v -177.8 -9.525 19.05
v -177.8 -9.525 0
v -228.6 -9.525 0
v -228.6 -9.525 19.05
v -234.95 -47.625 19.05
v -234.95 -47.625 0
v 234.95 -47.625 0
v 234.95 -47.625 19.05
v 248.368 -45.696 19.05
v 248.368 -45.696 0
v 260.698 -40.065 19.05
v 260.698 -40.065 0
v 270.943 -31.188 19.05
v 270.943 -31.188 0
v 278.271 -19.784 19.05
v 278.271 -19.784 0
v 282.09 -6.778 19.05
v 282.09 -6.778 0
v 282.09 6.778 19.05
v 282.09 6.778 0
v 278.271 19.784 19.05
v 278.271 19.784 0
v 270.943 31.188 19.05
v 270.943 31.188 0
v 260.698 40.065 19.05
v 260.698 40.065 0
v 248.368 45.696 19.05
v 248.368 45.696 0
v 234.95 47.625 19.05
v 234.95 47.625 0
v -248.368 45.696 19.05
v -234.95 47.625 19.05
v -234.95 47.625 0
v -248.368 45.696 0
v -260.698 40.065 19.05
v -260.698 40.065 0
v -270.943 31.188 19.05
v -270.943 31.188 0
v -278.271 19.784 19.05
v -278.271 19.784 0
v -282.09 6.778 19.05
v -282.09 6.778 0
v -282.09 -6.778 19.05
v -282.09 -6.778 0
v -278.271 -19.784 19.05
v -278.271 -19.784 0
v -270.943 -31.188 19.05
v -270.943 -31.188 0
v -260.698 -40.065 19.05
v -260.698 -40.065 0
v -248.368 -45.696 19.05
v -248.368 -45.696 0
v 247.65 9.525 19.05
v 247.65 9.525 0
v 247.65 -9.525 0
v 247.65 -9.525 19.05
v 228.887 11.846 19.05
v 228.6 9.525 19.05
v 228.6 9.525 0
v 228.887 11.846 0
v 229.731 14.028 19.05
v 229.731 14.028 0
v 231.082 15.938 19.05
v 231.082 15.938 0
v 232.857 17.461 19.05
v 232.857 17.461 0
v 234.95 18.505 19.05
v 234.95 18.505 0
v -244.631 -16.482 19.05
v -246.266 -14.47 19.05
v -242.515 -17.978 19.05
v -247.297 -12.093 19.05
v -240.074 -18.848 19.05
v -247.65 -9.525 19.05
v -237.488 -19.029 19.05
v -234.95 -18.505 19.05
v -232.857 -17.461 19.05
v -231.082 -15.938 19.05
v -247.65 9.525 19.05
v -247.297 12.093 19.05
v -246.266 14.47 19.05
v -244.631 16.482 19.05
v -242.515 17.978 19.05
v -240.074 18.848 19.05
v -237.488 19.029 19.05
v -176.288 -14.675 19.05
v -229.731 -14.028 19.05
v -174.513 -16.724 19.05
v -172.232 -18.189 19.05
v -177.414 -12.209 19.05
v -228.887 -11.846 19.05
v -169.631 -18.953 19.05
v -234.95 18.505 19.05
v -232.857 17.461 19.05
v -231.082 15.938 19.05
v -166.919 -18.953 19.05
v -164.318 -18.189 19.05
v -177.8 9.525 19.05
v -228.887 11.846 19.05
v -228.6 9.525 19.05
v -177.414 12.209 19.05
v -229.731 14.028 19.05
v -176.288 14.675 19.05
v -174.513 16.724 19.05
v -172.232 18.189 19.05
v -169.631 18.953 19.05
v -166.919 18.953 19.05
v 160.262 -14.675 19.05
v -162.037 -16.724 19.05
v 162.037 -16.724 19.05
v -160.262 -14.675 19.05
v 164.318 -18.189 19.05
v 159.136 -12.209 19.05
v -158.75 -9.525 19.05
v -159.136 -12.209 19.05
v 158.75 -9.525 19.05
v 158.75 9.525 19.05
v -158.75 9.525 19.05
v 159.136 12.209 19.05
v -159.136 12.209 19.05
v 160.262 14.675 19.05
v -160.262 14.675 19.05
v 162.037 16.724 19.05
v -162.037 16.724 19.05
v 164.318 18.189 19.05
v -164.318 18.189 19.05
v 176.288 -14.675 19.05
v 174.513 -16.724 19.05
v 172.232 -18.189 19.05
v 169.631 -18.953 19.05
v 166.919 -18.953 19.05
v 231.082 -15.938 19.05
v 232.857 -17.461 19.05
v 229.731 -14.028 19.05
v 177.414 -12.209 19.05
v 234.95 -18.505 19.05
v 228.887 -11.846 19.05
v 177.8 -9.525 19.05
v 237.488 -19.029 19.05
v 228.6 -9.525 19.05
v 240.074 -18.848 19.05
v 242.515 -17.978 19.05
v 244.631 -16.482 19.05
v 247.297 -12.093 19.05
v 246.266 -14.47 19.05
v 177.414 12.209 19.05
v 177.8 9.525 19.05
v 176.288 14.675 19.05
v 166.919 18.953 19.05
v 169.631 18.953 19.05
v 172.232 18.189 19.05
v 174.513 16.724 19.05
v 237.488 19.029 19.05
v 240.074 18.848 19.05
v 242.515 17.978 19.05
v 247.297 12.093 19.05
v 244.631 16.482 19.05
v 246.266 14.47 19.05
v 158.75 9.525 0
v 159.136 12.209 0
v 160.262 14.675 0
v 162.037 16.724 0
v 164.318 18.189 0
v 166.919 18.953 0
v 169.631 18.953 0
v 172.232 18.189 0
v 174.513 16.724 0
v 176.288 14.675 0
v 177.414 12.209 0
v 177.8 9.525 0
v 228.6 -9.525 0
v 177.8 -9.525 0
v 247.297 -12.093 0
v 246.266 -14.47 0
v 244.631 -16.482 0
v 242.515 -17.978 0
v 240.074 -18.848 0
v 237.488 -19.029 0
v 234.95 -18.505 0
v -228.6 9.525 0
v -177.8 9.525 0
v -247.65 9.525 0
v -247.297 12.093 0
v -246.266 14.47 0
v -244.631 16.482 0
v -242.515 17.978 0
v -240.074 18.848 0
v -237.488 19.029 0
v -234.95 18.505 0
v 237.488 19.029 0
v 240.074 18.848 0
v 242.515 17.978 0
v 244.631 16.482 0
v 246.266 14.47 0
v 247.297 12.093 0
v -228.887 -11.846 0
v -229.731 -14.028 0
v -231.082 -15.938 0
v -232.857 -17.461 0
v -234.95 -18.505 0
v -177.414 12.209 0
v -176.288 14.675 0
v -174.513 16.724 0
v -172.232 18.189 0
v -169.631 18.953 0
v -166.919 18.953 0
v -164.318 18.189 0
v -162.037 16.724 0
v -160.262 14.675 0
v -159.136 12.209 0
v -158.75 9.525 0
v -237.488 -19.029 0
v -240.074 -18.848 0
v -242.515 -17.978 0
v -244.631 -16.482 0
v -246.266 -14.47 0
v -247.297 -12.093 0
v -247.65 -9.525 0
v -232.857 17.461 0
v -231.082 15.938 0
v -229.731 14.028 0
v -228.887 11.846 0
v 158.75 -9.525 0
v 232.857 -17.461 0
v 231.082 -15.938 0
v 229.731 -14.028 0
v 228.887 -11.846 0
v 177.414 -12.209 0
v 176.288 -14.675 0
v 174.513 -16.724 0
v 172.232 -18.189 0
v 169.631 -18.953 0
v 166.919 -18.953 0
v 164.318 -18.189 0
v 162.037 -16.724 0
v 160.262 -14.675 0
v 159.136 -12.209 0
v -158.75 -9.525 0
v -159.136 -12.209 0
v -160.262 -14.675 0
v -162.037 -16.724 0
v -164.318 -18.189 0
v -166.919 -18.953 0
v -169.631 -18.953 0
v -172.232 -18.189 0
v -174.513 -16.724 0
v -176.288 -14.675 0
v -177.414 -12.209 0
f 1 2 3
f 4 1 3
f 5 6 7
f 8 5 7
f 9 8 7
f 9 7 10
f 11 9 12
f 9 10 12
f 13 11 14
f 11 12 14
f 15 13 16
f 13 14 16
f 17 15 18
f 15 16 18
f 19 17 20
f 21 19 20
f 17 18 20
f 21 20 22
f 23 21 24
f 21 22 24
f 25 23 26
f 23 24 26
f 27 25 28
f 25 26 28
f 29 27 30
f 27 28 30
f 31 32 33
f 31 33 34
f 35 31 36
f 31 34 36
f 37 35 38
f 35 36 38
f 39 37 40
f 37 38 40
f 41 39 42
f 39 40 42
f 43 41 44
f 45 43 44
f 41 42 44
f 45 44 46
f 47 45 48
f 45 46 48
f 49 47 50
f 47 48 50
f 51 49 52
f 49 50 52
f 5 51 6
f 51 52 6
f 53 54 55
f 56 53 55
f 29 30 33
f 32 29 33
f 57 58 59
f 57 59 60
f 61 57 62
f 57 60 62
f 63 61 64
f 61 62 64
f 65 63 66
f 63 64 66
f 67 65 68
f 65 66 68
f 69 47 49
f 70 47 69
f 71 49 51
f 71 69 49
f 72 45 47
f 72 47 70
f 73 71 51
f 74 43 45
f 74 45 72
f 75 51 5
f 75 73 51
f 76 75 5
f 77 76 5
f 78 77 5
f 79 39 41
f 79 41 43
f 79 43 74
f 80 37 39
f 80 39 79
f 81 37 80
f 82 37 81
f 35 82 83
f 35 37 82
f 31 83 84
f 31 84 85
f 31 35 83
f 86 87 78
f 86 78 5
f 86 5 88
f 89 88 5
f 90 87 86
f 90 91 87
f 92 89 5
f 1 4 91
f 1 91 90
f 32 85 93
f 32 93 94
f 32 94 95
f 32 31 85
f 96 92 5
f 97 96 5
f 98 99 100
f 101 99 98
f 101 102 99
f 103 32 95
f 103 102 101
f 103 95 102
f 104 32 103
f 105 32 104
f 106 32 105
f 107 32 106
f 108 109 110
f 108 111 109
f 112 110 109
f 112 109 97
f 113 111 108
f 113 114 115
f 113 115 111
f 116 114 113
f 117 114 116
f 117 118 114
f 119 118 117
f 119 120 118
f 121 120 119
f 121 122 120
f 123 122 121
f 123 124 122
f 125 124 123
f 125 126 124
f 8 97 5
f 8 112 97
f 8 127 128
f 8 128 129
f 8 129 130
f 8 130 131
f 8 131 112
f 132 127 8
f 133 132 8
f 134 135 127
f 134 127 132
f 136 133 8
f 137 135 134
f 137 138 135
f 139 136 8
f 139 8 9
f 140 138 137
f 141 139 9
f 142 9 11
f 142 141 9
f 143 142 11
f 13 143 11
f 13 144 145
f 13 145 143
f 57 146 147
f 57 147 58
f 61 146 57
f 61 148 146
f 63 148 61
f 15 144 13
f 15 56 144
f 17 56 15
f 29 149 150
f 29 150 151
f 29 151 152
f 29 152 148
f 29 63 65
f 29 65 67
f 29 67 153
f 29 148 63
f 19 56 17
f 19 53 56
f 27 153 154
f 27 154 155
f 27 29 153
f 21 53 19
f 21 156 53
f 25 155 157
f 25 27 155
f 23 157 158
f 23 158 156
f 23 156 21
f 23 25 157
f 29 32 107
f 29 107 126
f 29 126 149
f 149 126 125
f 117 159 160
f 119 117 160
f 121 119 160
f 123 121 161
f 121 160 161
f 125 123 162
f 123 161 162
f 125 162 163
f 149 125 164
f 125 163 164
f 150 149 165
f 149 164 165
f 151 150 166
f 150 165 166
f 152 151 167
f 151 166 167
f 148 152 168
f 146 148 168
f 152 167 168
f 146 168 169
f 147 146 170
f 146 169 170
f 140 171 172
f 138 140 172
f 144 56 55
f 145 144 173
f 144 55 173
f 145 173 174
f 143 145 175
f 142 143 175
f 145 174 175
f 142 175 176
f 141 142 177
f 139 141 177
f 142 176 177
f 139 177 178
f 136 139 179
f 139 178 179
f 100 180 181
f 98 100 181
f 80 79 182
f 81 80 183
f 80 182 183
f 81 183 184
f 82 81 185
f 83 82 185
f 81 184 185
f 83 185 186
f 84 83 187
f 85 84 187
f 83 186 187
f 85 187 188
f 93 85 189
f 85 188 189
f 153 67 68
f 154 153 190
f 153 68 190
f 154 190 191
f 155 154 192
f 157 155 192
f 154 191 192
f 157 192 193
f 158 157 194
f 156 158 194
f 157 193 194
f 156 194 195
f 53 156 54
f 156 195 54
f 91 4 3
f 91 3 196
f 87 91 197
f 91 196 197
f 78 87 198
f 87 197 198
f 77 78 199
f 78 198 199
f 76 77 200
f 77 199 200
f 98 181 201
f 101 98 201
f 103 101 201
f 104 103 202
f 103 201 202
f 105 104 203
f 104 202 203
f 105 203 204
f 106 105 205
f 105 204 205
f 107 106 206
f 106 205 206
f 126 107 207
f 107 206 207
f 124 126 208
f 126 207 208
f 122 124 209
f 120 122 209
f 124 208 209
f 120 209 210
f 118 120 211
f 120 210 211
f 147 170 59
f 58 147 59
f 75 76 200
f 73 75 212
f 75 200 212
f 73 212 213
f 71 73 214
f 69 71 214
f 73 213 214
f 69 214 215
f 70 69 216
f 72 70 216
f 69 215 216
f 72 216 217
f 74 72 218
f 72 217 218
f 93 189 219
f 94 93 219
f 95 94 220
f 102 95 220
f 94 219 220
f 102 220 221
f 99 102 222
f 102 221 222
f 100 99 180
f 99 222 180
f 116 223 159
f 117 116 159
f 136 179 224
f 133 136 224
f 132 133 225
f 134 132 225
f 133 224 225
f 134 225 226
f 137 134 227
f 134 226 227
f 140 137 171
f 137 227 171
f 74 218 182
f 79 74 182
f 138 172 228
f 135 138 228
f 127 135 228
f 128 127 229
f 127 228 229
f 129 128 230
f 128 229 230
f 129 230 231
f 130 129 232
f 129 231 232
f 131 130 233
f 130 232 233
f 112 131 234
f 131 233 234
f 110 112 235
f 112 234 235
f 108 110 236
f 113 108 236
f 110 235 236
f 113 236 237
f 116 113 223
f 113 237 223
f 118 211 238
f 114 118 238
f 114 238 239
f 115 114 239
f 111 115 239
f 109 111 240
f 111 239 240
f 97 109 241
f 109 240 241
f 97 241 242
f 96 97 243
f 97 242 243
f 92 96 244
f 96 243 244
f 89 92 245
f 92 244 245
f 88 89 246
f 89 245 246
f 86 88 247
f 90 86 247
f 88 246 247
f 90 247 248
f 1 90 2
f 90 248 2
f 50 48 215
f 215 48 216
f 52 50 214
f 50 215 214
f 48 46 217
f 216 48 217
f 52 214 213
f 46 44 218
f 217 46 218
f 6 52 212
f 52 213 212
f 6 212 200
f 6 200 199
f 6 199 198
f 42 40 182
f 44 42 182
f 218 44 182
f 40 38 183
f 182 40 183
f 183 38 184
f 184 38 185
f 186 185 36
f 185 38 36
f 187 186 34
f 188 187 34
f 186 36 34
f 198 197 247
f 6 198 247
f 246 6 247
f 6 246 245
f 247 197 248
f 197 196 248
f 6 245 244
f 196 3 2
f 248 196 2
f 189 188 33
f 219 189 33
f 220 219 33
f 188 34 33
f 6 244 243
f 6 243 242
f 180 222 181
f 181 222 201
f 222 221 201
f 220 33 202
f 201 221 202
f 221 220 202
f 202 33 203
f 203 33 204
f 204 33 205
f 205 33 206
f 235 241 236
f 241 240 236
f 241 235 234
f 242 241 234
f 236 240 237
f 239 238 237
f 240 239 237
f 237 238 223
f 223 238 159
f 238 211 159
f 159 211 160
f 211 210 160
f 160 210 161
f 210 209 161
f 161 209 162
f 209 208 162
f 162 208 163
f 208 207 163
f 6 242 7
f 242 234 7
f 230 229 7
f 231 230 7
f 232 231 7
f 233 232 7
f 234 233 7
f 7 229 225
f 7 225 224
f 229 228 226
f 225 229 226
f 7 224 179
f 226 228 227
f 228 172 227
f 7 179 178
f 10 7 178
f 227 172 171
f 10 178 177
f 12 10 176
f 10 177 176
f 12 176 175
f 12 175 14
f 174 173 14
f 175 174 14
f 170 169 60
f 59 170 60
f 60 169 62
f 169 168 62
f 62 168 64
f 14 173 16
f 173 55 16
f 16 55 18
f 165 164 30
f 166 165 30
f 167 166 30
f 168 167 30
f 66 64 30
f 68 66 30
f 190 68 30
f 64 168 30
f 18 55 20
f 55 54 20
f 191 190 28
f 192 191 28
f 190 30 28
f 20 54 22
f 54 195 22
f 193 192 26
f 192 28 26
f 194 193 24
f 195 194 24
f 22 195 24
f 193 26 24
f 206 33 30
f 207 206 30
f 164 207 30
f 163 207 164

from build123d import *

# Parameters (mm, degrees)
F2_DEPTH = 19.05


# Not quite as in the source:
# - a variable given as a bare number and used for a length is read in inches; the dataset says mm whatever the document's units were


with BuildPart() as f2:
    # F1 (on Top) → F2 (new body)
    with BuildSketch(Plane.XY):
        with BuildLine():
            Line((234.95, 47.625), (-234.95, 47.625))
            Line((-234.95, 47.625), (-234.95, 18.5052561211))
            ThreePointArc((-234.95, 18.5052561211), (-230.3478700667, 15.024261314), (-228.6, 9.525))
            Line((-228.6, 9.525), (-177.8, 9.525))
            ThreePointArc((-177.8, 9.525), (-168.275, 19.05), (-158.75, 9.525))
            Line((-158.75, 9.525), (-158.75, -9.525))
            ThreePointArc((-158.75, -9.525), (-168.275, -19.05), (-177.8, -9.525))
            Line((-177.8, -9.525), (-228.6, -9.525))
            ThreePointArc((-228.6, -9.525), (-230.3478700667, -15.024261314), (-234.95, -18.5052561211))
            Line((-234.95, -18.5052561211), (-234.95, -47.625))
            Line((-234.95, -47.625), (234.95, -47.625))
            Line((234.95, -47.625), (234.95, -18.5052561211))
            ThreePointArc((234.95, -18.5052561211), (230.3478700667, -15.024261314), (228.6, -9.525))
            Line((228.6, -9.525), (177.8, -9.525))
            ThreePointArc((177.8, -9.525), (168.275, -19.05), (158.75, -9.525))
            Line((158.75, -9.525), (158.75, 9.525))
            ThreePointArc((158.75, 9.525), (168.275, 19.05), (177.8, 9.525))
            Line((177.8, 9.525), (228.6, 9.525))
            ThreePointArc((228.6, 9.525), (230.3478700667, 15.024261314), (234.95, 18.5052561211))
            Line((234.95, 18.5052561211), (234.95, 47.625))
        make_face()
        with BuildLine():
            Line((-234.95, 18.5052561211), (-234.95, 47.625))
            ThreePointArc((-234.95, 47.625), (-282.575, 0), (-234.95, -47.625))
            Line((-234.95, -47.625), (-234.95, -18.5052561211))
            ThreePointArc((-234.95, -18.5052561211), (-243.624261314, -17.3021299333), (-247.65, -9.525))
            Line((-247.65, -9.525), (-247.65, 9.525))
            ThreePointArc((-247.65, 9.525), (-243.624261314, 17.3021299333), (-234.95, 18.5052561211))
        make_face()
        with BuildLine():
            ThreePointArc((234.95, -47.625), (282.575, 0), (234.95, 47.625))
            Line((234.95, 47.625), (234.95, 18.5052561211))
            ThreePointArc((234.95, 18.5052561211), (243.624261314, 17.3021299333), (247.65, 9.525))
            Line((247.65, 9.525), (247.65, -9.525))
            ThreePointArc((247.65, -9.525), (243.624261314, -17.3021299333), (234.95, -18.5052561211))
            Line((234.95, -18.5052561211), (234.95, -47.625))
        make_face()
    extrude(amount=F2_DEPTH)


solid = f2.part
